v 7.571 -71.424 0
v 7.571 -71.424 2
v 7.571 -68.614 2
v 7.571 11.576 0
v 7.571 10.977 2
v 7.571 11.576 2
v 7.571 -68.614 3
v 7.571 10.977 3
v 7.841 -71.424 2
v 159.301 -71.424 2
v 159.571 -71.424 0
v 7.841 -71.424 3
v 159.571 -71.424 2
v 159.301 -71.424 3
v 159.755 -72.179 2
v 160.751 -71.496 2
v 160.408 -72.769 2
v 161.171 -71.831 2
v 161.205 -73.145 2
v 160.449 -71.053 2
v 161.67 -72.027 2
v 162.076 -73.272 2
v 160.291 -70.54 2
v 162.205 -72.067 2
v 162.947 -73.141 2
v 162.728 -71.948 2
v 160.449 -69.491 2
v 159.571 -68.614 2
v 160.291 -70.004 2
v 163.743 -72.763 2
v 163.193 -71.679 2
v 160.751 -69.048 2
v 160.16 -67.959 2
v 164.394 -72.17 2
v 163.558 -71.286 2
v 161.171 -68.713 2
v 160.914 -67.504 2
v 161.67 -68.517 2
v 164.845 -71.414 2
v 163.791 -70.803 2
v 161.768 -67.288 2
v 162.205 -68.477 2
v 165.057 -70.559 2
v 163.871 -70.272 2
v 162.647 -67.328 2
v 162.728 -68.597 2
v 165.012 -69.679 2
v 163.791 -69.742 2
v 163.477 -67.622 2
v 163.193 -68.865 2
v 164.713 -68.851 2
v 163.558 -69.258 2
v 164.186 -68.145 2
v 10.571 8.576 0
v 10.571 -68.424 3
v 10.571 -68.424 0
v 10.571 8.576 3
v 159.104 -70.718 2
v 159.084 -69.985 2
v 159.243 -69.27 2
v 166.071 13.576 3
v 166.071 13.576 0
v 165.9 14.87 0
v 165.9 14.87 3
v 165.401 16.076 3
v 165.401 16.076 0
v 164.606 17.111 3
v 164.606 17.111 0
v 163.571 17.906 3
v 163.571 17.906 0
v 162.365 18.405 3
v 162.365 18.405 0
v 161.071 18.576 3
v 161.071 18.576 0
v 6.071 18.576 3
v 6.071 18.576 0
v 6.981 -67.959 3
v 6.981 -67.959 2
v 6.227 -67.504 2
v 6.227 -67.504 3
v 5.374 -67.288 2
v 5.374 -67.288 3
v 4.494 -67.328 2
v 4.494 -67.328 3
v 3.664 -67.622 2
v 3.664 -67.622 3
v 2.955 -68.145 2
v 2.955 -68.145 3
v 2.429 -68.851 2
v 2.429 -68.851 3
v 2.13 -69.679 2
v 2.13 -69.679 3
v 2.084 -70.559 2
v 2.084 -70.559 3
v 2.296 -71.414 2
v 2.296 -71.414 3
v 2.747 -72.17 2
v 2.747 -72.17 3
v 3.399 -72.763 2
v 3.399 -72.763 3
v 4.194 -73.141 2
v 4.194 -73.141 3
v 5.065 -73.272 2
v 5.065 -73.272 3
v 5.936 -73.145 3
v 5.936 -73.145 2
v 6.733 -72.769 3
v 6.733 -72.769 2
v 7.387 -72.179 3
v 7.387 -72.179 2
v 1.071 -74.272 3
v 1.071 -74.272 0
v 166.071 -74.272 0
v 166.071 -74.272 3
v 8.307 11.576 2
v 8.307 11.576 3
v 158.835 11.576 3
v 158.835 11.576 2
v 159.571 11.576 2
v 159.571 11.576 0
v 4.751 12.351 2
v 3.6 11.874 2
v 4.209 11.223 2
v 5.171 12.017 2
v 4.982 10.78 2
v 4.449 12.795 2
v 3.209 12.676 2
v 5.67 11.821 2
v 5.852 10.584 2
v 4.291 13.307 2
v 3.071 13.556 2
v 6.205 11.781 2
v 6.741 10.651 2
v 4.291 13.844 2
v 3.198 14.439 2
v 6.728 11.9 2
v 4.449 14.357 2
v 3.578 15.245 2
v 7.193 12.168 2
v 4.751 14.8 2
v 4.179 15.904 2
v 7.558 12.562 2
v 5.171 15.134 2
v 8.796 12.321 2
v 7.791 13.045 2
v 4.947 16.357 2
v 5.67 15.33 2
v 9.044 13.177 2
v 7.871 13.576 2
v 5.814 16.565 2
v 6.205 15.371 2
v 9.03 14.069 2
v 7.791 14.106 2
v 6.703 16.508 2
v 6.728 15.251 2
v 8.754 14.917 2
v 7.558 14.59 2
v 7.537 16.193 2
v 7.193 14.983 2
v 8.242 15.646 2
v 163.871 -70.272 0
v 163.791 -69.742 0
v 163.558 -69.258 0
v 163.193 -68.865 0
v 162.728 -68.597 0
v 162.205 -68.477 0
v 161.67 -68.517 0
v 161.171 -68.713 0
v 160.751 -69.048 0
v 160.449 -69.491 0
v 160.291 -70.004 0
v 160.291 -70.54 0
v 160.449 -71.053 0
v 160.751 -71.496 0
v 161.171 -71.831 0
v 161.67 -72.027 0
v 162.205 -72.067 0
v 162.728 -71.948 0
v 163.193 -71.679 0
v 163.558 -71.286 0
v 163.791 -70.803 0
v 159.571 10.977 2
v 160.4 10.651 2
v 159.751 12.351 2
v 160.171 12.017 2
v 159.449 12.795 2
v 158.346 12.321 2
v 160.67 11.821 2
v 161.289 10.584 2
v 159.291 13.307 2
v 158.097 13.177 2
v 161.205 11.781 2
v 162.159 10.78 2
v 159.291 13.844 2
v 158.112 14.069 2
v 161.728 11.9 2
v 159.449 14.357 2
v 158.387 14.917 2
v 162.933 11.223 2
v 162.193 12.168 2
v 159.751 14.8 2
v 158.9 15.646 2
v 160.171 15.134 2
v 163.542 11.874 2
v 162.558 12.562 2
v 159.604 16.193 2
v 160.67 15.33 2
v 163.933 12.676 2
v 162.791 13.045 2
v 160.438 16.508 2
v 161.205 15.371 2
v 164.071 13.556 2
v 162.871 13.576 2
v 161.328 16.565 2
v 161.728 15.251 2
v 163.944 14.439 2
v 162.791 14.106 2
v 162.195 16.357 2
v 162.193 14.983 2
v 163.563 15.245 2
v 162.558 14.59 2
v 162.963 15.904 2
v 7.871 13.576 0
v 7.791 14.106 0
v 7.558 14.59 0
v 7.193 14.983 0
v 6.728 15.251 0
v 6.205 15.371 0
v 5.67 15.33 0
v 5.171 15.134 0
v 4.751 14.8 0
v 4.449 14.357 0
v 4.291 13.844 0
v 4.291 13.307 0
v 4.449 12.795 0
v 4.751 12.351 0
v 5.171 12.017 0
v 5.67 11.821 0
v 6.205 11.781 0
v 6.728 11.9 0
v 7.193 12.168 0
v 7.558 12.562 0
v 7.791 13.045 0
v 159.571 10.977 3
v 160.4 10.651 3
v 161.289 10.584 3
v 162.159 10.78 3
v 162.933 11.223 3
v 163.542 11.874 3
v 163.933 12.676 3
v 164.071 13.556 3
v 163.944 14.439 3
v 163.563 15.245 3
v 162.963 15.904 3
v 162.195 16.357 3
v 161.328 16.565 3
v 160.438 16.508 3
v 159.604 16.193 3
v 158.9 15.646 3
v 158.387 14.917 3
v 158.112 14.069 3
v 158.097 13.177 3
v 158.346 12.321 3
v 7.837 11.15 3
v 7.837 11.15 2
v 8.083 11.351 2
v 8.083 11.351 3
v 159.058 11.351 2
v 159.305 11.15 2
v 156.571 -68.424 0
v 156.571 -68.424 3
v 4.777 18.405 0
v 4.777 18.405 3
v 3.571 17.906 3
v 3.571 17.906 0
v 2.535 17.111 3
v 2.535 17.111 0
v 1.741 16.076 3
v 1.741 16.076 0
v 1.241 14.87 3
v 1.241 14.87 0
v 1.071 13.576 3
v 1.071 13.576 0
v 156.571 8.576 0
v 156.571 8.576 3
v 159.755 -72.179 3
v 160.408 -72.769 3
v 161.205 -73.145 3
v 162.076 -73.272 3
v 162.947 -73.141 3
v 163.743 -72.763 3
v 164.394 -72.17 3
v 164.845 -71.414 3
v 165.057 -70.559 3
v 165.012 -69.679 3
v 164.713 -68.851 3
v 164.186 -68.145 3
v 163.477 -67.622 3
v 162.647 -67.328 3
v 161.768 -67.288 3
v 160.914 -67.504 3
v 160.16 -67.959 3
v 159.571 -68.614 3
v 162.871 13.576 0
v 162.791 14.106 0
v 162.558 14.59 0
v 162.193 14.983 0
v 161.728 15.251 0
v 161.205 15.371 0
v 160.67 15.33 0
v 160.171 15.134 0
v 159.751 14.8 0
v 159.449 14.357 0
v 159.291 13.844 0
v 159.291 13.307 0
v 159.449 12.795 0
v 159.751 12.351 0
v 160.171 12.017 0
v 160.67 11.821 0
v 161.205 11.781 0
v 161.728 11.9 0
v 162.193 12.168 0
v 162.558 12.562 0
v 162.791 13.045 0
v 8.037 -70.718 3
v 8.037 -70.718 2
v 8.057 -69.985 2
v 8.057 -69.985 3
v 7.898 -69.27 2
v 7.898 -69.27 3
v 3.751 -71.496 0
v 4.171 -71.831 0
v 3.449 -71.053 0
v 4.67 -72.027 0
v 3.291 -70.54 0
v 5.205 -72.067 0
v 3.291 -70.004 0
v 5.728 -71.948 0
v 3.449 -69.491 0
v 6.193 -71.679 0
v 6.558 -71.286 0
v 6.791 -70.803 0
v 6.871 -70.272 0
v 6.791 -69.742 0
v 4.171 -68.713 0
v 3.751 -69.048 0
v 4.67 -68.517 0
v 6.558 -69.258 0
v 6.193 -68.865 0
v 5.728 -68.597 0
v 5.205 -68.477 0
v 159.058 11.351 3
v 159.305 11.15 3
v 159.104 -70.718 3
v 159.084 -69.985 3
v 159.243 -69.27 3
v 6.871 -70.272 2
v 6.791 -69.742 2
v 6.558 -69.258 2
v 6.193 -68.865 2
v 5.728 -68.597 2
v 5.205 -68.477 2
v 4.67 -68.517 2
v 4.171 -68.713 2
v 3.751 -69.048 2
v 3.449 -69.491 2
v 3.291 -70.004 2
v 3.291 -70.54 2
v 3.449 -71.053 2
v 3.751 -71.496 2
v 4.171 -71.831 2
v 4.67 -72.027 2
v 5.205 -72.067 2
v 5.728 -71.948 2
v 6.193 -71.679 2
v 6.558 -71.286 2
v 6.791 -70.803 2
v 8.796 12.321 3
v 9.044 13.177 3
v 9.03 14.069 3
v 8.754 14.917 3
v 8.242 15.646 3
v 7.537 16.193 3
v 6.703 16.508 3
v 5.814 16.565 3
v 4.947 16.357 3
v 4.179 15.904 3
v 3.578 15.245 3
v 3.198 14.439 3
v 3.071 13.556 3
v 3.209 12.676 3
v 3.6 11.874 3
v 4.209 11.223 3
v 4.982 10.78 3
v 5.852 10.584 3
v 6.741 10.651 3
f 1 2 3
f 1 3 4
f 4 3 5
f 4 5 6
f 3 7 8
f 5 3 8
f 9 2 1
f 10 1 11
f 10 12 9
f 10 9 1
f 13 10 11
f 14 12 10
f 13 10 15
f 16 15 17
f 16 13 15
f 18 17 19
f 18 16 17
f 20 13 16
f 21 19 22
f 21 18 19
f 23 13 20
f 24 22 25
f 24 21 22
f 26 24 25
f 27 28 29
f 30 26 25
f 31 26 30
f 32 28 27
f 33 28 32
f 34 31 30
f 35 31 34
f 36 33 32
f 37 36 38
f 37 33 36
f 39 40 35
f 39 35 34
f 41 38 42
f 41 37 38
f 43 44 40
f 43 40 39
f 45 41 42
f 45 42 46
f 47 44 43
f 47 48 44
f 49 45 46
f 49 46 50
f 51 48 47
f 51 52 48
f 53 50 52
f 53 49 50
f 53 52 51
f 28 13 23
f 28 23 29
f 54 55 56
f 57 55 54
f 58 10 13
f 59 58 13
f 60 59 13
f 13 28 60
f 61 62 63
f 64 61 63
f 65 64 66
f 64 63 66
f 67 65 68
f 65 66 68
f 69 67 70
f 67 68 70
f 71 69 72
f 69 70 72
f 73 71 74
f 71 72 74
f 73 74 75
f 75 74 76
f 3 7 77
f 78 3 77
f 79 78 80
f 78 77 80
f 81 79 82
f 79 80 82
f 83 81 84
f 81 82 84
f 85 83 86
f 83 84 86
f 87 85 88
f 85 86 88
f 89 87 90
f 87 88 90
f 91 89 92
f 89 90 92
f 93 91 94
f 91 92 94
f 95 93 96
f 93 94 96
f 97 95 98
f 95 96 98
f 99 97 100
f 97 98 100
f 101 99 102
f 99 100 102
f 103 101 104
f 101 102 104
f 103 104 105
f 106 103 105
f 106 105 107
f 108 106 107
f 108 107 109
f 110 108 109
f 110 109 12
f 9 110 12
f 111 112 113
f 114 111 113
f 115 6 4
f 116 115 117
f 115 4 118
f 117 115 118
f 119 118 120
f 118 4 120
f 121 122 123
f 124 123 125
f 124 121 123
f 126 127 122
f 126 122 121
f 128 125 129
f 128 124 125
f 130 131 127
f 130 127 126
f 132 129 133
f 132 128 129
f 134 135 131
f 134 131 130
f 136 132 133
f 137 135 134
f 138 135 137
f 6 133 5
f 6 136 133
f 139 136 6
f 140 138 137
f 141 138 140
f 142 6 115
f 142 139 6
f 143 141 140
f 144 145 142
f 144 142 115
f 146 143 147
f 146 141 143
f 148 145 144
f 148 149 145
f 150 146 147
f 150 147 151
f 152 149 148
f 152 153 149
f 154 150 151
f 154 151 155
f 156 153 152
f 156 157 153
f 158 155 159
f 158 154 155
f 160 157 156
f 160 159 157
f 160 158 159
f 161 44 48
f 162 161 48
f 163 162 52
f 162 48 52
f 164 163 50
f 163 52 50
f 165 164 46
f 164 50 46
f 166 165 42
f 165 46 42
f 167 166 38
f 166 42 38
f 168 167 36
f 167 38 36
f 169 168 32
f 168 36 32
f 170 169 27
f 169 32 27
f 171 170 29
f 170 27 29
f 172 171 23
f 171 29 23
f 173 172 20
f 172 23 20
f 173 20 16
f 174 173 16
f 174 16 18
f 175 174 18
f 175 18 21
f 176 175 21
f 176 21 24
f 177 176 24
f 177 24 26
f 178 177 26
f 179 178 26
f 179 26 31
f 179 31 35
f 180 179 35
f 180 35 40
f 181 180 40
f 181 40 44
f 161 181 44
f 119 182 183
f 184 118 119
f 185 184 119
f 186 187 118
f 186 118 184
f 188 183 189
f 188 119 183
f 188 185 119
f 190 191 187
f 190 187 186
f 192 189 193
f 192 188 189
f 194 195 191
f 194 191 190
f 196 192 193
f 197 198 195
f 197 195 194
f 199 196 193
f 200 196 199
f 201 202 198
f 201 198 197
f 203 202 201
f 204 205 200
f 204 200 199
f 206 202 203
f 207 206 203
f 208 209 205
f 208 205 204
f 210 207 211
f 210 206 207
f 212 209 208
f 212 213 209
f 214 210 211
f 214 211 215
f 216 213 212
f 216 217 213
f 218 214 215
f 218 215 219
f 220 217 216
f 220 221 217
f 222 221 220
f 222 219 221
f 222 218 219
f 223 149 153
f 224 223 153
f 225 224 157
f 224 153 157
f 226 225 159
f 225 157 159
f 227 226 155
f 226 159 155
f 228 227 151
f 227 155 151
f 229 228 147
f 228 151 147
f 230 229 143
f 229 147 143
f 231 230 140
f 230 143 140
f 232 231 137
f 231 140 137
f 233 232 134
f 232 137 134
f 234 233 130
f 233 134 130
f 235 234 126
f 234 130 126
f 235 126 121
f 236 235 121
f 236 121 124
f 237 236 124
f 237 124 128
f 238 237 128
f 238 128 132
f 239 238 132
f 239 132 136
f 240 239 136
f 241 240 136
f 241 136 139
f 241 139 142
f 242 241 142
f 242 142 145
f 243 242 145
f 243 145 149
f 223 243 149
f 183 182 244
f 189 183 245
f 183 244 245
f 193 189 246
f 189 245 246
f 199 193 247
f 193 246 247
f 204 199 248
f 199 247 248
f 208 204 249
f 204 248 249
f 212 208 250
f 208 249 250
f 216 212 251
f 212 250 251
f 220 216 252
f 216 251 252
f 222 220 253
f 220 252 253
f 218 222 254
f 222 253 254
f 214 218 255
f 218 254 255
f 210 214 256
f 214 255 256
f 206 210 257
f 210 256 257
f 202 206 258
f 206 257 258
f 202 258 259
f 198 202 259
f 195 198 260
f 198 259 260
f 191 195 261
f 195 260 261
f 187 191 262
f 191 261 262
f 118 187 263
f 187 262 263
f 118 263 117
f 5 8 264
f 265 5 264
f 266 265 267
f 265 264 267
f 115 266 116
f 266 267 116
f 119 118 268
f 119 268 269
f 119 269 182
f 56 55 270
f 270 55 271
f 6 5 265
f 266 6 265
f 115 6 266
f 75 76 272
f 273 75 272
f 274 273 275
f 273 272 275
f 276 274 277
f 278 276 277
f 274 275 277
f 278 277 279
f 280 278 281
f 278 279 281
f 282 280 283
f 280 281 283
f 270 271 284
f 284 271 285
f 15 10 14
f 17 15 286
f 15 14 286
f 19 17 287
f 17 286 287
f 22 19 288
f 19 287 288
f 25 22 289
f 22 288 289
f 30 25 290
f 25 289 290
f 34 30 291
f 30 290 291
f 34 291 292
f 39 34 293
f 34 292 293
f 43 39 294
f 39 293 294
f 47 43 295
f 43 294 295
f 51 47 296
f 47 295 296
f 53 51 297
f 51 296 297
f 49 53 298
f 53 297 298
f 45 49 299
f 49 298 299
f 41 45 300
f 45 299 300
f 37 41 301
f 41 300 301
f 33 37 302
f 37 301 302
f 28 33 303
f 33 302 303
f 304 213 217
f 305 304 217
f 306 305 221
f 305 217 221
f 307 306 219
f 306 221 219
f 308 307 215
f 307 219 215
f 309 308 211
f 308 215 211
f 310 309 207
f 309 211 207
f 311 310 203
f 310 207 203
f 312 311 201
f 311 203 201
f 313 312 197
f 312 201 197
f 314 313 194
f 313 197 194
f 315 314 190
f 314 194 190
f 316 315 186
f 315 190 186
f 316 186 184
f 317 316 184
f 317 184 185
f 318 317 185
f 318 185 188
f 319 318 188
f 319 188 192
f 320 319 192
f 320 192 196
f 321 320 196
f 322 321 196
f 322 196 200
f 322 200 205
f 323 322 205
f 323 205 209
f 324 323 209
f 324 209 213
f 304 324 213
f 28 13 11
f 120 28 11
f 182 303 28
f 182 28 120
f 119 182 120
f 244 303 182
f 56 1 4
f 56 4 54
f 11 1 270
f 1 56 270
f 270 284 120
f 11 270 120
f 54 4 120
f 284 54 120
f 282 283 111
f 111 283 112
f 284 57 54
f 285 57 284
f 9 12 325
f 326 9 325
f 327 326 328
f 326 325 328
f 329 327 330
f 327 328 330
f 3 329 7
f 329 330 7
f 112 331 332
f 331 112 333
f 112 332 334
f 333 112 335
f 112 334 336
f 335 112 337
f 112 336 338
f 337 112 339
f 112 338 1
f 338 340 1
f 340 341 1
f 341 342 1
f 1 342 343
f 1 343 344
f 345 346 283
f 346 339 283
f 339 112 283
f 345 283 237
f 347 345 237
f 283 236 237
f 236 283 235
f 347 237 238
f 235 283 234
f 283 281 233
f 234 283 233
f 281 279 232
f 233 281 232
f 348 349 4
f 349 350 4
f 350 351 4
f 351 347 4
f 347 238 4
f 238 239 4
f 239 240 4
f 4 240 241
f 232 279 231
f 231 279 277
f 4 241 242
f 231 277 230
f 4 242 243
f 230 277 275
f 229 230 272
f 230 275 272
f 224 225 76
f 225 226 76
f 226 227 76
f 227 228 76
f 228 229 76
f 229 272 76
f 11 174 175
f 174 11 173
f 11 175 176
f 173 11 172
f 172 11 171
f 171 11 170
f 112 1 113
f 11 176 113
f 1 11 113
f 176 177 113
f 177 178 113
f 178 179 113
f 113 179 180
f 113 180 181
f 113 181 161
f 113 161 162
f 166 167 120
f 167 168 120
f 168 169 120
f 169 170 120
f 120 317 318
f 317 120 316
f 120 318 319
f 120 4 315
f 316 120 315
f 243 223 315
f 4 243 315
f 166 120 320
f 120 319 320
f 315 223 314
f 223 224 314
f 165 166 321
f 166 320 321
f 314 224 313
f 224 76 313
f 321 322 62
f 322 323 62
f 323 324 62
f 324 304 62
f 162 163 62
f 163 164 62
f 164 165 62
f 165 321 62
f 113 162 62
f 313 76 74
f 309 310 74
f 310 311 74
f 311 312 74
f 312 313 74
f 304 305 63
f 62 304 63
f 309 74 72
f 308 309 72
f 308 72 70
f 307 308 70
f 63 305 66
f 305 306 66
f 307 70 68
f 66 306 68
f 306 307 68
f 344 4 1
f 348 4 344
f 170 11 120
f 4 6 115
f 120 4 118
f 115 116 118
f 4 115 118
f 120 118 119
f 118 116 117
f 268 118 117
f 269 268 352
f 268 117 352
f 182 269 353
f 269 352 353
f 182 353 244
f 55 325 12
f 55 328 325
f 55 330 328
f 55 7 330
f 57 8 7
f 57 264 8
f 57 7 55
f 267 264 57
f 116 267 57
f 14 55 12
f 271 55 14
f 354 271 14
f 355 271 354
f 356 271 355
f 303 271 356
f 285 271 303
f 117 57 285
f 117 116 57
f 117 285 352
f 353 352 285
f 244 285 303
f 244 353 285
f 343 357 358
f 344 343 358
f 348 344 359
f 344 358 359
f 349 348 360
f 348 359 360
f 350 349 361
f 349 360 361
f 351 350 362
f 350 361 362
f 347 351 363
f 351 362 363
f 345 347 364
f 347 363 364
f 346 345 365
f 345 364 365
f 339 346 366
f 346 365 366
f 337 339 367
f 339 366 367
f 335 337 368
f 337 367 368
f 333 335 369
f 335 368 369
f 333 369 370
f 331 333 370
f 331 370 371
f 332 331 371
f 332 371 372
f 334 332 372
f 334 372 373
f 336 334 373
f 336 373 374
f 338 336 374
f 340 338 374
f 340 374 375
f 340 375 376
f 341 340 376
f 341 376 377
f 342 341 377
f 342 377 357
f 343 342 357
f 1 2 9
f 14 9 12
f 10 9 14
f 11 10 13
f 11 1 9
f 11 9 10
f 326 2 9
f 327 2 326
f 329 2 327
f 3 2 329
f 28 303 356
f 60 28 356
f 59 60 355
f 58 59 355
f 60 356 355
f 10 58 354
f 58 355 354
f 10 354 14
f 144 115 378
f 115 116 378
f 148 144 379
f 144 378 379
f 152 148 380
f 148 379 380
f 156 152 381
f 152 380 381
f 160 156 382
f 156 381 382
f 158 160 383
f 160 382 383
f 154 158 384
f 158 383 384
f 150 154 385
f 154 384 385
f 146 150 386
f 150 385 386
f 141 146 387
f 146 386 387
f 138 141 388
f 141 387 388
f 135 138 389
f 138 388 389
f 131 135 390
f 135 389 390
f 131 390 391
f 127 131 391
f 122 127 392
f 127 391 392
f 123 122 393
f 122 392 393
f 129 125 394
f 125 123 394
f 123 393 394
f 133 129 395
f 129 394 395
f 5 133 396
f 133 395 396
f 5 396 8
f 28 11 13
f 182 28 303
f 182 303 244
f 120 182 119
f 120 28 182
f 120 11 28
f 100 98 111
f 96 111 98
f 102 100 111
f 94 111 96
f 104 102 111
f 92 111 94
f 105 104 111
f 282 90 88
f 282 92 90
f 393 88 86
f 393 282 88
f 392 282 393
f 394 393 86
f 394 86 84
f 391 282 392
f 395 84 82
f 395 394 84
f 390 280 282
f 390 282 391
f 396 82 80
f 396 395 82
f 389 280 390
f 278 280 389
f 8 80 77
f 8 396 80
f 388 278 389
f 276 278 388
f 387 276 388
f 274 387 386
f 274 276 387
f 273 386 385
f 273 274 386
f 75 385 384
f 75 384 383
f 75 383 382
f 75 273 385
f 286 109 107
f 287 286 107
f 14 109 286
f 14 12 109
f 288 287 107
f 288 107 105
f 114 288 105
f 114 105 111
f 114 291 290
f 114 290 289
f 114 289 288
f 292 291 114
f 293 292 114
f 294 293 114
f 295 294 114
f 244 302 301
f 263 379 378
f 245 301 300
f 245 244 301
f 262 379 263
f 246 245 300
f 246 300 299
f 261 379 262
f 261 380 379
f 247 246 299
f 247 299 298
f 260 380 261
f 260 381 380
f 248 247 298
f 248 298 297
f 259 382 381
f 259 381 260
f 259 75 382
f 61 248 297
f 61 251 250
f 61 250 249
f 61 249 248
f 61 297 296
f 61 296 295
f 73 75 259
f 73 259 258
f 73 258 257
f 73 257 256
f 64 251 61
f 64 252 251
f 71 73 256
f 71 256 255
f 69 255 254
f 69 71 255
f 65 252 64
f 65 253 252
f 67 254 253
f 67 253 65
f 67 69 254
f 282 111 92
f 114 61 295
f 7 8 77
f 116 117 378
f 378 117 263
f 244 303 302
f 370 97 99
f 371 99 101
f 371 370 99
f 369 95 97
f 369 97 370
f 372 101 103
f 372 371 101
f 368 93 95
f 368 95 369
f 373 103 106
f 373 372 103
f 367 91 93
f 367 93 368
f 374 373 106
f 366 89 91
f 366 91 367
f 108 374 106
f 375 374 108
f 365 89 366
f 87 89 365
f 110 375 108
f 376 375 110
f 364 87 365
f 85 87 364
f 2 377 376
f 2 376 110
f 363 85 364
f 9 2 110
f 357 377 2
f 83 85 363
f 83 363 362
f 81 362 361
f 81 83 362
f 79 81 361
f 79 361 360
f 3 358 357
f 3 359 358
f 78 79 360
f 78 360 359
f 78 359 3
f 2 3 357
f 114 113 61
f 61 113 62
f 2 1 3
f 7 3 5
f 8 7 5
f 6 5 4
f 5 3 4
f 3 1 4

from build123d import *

# Parameters (mm, degrees)
SKETCH_2_W          = 152
SKETCH_2_H          = 83
EXTRUDE_1_DEPTH     = 3
SKETCH_3_W          = 152
SKETCH_3_H          = 83
SKETCH_3_W_2        = 146
SKETCH_3_H_2        = 77
EXTRUDE_2_DEPTH     = 3
SKETCH_4_R          = 1.8
CUT_EXTRUDE_1_DEPTH = 3
SKETCH_5_R          = 3
CUT_EXTRUDE_2_DEPTH = 1


with BuildPart() as part:
    # 草图2 → 凸台-拉伸1 (new body)
    with BuildSketch(Plane.XY):
        with BuildLine():
            Line((1.07069486, 13.575557044), (1.07069486, -65.621700899))
            Line((1.07069486, -65.621700899), (1.07069486, -74.272168286))
            Line((1.07069486, -74.272168286), (166.07069486, -74.272168286))
            Line((166.07069486, -74.272168286), (166.07069486, -65.621700899))
            Line((166.07069486, -65.621700899), (166.07069486, 13.575557044))
            ThreePointArc((166.07069486, 13.575557044), (164.606228766, 17.11109095), (161.07069486, 18.575557044))
            Line((161.07069486, 18.575557044), (6.07069486, 18.575557044))
            ThreePointArc((6.07069486, 18.575557044), (2.535160954, 17.11109095), (1.07069486, 13.575557044))
        make_face()
        with Locations((83.57069486, -29.924442956)):
            Rectangle(SKETCH_2_W, SKETCH_2_H, mode=Mode.SUBTRACT)
    extrude(amount=EXTRUDE_1_DEPTH)

    # 草图4 → 切除-拉伸1 (cut)
    with BuildSketch(Plane.XY.offset(3)):
        with Locations((6.07069486, 13.575557044)):
            Circle(SKETCH_4_R)
        with Locations((161.07069486, 13.575557044)):
            Circle(SKETCH_4_R)
        with Locations((5.07069486, -70.272168286)):
            Circle(SKETCH_4_R)
        with Locations((162.07069486, -70.272168286)):
            Circle(SKETCH_4_R)
    extrude(amount=-CUT_EXTRUDE_1_DEPTH, mode=Mode.SUBTRACT)


with BuildPart() as body_2:
    # 草图3 → 凸台-拉伸2 (new body)
    with BuildSketch(Plane.XY.offset(3)):
        with Locations((83.57069486, -29.924442956)):
            Rectangle(SKETCH_3_W, SKETCH_3_H)
        with Locations((83.57069486, -29.924442956)):
            Rectangle(SKETCH_3_W_2, SKETCH_3_H_2, mode=Mode.SUBTRACT)
    extrude(amount=-EXTRUDE_2_DEPTH)


with BuildPart() as cut_extrude_2_tool:
    # 草图5 → 切除-拉伸2 (new body)
    with BuildSketch(Plane.XY.offset(3)):
        with Locations((6.07069486, 13.575557044)):
            Circle(SKETCH_5_R)
        with Locations((161.07069486, 13.575557044)):
            Circle(SKETCH_5_R)
        with Locations((5.07069486, -70.272168286)):
            Circle(SKETCH_5_R)
        with Locations((162.07069486, -70.272168286)):
            Circle(SKETCH_5_R)
    extrude(amount=-CUT_EXTRUDE_2_DEPTH)


with BuildPart() as part_1:
    add(part.part)

    # 切除-拉伸2: cut by cut_extrude_2_tool
    add(cut_extrude_2_tool.part, mode=Mode.SUBTRACT)


with BuildPart() as body_2_1:
    add(body_2.part)

    # 切除-拉伸2: cut by cut_extrude_2_tool
    add(cut_extrude_2_tool.part, mode=Mode.SUBTRACT)


solid = Compound([part_1.part, body_2_1.part])
